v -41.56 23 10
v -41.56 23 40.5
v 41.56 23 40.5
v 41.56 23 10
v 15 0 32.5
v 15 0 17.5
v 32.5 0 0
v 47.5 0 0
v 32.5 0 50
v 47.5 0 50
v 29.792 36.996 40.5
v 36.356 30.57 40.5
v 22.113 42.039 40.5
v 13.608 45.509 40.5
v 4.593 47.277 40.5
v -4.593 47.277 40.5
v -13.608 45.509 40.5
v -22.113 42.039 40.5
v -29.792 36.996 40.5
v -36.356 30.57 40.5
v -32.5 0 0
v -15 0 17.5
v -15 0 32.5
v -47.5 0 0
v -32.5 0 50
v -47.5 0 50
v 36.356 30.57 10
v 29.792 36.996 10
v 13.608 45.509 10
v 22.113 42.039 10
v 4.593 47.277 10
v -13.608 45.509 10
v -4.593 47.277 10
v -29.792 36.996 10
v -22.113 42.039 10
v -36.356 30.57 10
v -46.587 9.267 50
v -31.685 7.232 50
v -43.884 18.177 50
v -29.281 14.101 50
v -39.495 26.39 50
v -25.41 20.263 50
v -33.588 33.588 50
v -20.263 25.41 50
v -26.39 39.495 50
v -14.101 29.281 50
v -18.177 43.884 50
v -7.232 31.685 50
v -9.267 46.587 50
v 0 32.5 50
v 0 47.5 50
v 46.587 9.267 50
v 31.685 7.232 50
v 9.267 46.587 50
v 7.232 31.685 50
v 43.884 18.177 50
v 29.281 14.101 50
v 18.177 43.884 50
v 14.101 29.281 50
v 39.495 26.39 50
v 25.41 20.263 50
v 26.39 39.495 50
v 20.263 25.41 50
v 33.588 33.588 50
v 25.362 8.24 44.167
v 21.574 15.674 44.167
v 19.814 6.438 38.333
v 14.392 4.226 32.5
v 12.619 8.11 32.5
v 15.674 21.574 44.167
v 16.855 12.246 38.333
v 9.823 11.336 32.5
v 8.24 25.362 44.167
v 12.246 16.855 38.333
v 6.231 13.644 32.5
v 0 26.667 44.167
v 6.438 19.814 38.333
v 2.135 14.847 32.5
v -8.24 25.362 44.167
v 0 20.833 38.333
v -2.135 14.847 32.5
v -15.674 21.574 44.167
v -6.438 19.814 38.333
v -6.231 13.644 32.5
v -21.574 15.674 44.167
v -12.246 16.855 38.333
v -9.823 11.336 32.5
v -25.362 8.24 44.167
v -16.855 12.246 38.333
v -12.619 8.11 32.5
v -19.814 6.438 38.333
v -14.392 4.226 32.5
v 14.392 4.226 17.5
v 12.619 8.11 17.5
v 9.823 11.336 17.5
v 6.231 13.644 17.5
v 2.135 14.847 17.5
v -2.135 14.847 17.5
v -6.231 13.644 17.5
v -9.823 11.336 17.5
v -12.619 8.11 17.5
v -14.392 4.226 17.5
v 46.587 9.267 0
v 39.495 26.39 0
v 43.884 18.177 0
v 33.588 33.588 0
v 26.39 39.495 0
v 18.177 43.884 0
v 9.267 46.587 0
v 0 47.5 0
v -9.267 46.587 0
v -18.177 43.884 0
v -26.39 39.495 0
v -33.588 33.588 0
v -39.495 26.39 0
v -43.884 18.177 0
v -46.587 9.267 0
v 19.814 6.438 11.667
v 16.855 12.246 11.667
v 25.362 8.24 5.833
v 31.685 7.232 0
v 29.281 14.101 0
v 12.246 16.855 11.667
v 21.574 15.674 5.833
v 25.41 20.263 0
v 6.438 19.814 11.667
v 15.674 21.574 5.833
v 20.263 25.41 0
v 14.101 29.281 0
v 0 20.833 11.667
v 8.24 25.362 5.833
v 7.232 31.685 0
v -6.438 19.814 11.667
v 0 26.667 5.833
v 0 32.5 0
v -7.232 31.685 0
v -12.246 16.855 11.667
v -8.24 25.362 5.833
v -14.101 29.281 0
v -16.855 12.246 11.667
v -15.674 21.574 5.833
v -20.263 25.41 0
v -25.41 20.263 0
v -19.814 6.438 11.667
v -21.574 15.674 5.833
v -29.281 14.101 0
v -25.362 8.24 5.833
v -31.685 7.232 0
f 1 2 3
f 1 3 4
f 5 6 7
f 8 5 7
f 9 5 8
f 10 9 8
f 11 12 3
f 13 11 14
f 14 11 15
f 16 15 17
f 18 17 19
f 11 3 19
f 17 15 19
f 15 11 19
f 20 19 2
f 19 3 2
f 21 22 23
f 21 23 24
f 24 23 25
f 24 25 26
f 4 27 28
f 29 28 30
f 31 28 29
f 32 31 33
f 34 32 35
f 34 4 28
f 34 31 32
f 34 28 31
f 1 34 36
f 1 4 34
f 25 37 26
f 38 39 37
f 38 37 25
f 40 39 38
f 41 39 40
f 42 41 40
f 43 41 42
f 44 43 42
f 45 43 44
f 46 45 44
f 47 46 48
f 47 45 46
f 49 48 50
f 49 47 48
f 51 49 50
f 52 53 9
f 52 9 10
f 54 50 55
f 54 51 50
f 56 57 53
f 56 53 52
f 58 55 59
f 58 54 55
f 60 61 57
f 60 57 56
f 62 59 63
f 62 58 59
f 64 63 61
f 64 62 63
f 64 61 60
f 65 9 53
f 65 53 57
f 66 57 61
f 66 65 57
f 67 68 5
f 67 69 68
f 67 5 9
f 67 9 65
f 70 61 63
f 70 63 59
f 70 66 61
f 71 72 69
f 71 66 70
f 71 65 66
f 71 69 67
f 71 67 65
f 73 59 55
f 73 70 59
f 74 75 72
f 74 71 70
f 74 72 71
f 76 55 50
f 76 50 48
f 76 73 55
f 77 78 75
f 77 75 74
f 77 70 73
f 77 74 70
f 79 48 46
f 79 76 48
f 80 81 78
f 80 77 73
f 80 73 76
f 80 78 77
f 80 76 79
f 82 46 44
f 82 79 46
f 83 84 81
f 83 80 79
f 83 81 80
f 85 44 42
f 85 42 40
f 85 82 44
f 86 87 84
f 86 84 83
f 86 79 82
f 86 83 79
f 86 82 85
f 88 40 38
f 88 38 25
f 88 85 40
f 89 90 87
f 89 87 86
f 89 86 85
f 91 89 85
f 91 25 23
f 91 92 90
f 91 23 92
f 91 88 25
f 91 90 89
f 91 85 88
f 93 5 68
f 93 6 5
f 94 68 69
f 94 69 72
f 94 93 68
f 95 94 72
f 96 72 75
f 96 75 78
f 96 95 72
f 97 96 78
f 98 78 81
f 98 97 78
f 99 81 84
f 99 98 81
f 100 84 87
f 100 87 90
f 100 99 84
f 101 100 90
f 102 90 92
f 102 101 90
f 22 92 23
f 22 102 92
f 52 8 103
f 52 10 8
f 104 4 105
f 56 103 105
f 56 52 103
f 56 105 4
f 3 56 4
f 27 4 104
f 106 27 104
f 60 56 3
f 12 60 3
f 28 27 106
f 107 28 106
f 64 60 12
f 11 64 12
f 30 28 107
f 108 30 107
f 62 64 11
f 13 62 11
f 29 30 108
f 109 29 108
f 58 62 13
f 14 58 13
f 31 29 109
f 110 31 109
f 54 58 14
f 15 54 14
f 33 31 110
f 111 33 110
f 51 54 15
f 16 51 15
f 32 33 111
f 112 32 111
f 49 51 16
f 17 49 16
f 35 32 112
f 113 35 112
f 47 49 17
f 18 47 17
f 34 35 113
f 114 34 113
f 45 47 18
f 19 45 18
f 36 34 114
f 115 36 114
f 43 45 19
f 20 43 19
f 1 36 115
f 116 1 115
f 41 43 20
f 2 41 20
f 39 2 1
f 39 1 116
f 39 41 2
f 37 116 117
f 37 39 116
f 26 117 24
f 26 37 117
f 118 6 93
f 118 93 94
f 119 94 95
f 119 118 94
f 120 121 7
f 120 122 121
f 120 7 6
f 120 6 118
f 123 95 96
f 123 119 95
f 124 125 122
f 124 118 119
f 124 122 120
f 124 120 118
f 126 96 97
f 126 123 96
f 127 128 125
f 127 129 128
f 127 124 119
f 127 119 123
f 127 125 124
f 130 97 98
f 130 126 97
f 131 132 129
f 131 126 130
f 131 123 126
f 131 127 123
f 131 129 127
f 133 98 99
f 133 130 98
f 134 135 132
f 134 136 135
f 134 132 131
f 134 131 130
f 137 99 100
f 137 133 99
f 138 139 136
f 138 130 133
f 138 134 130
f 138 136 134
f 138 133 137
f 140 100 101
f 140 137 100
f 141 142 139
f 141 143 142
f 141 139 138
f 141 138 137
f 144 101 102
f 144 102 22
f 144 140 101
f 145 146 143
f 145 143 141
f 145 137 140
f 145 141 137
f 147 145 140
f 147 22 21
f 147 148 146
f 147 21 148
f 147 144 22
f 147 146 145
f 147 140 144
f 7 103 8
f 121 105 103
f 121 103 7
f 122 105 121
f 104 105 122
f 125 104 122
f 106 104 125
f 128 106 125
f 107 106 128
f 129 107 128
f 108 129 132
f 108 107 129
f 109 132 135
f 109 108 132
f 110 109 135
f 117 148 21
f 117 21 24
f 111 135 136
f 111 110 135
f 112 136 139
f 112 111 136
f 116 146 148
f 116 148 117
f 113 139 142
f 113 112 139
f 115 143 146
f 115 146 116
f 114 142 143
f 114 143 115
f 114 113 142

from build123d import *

# Parameters (mm, degrees)
SKETCH009_W         = 30.5
SKETCH009_H         = 187.185136
EXTRUDE005_DEPTH    = 40
REVOLUTION001_ANGLE = 180


with BuildPart() as extrude005:
    # Sketch009 → Extrude005 (new body)
    with BuildSketch(Plane(origin=(22, 23, 10), x_dir=(0, 0, -1), z_dir=(0, 1, 0))):
        with Locations((-15.25, 27)):
            Rectangle(SKETCH009_W, SKETCH009_H)
    extrude(amount=EXTRUDE005_DEPTH)


with BuildPart() as cut004:
    # Sketch002 → Revolution001 (revolve)
    with BuildSketch(Plane.XZ):
        Polygon((32.5, 50), (15, 32.5), (15, 17.5), (32.5, 0), (47.5, 0), (47.5, 50), align=None)
    revolve(axis=Axis((0, 0, 0), (0, 0, 1)), revolution_arc=REVOLUTION001_ANGLE)

    # Cut004: cut Extrude005
    add(extrude005.part, mode=Mode.SUBTRACT)


solid = cut004.part
